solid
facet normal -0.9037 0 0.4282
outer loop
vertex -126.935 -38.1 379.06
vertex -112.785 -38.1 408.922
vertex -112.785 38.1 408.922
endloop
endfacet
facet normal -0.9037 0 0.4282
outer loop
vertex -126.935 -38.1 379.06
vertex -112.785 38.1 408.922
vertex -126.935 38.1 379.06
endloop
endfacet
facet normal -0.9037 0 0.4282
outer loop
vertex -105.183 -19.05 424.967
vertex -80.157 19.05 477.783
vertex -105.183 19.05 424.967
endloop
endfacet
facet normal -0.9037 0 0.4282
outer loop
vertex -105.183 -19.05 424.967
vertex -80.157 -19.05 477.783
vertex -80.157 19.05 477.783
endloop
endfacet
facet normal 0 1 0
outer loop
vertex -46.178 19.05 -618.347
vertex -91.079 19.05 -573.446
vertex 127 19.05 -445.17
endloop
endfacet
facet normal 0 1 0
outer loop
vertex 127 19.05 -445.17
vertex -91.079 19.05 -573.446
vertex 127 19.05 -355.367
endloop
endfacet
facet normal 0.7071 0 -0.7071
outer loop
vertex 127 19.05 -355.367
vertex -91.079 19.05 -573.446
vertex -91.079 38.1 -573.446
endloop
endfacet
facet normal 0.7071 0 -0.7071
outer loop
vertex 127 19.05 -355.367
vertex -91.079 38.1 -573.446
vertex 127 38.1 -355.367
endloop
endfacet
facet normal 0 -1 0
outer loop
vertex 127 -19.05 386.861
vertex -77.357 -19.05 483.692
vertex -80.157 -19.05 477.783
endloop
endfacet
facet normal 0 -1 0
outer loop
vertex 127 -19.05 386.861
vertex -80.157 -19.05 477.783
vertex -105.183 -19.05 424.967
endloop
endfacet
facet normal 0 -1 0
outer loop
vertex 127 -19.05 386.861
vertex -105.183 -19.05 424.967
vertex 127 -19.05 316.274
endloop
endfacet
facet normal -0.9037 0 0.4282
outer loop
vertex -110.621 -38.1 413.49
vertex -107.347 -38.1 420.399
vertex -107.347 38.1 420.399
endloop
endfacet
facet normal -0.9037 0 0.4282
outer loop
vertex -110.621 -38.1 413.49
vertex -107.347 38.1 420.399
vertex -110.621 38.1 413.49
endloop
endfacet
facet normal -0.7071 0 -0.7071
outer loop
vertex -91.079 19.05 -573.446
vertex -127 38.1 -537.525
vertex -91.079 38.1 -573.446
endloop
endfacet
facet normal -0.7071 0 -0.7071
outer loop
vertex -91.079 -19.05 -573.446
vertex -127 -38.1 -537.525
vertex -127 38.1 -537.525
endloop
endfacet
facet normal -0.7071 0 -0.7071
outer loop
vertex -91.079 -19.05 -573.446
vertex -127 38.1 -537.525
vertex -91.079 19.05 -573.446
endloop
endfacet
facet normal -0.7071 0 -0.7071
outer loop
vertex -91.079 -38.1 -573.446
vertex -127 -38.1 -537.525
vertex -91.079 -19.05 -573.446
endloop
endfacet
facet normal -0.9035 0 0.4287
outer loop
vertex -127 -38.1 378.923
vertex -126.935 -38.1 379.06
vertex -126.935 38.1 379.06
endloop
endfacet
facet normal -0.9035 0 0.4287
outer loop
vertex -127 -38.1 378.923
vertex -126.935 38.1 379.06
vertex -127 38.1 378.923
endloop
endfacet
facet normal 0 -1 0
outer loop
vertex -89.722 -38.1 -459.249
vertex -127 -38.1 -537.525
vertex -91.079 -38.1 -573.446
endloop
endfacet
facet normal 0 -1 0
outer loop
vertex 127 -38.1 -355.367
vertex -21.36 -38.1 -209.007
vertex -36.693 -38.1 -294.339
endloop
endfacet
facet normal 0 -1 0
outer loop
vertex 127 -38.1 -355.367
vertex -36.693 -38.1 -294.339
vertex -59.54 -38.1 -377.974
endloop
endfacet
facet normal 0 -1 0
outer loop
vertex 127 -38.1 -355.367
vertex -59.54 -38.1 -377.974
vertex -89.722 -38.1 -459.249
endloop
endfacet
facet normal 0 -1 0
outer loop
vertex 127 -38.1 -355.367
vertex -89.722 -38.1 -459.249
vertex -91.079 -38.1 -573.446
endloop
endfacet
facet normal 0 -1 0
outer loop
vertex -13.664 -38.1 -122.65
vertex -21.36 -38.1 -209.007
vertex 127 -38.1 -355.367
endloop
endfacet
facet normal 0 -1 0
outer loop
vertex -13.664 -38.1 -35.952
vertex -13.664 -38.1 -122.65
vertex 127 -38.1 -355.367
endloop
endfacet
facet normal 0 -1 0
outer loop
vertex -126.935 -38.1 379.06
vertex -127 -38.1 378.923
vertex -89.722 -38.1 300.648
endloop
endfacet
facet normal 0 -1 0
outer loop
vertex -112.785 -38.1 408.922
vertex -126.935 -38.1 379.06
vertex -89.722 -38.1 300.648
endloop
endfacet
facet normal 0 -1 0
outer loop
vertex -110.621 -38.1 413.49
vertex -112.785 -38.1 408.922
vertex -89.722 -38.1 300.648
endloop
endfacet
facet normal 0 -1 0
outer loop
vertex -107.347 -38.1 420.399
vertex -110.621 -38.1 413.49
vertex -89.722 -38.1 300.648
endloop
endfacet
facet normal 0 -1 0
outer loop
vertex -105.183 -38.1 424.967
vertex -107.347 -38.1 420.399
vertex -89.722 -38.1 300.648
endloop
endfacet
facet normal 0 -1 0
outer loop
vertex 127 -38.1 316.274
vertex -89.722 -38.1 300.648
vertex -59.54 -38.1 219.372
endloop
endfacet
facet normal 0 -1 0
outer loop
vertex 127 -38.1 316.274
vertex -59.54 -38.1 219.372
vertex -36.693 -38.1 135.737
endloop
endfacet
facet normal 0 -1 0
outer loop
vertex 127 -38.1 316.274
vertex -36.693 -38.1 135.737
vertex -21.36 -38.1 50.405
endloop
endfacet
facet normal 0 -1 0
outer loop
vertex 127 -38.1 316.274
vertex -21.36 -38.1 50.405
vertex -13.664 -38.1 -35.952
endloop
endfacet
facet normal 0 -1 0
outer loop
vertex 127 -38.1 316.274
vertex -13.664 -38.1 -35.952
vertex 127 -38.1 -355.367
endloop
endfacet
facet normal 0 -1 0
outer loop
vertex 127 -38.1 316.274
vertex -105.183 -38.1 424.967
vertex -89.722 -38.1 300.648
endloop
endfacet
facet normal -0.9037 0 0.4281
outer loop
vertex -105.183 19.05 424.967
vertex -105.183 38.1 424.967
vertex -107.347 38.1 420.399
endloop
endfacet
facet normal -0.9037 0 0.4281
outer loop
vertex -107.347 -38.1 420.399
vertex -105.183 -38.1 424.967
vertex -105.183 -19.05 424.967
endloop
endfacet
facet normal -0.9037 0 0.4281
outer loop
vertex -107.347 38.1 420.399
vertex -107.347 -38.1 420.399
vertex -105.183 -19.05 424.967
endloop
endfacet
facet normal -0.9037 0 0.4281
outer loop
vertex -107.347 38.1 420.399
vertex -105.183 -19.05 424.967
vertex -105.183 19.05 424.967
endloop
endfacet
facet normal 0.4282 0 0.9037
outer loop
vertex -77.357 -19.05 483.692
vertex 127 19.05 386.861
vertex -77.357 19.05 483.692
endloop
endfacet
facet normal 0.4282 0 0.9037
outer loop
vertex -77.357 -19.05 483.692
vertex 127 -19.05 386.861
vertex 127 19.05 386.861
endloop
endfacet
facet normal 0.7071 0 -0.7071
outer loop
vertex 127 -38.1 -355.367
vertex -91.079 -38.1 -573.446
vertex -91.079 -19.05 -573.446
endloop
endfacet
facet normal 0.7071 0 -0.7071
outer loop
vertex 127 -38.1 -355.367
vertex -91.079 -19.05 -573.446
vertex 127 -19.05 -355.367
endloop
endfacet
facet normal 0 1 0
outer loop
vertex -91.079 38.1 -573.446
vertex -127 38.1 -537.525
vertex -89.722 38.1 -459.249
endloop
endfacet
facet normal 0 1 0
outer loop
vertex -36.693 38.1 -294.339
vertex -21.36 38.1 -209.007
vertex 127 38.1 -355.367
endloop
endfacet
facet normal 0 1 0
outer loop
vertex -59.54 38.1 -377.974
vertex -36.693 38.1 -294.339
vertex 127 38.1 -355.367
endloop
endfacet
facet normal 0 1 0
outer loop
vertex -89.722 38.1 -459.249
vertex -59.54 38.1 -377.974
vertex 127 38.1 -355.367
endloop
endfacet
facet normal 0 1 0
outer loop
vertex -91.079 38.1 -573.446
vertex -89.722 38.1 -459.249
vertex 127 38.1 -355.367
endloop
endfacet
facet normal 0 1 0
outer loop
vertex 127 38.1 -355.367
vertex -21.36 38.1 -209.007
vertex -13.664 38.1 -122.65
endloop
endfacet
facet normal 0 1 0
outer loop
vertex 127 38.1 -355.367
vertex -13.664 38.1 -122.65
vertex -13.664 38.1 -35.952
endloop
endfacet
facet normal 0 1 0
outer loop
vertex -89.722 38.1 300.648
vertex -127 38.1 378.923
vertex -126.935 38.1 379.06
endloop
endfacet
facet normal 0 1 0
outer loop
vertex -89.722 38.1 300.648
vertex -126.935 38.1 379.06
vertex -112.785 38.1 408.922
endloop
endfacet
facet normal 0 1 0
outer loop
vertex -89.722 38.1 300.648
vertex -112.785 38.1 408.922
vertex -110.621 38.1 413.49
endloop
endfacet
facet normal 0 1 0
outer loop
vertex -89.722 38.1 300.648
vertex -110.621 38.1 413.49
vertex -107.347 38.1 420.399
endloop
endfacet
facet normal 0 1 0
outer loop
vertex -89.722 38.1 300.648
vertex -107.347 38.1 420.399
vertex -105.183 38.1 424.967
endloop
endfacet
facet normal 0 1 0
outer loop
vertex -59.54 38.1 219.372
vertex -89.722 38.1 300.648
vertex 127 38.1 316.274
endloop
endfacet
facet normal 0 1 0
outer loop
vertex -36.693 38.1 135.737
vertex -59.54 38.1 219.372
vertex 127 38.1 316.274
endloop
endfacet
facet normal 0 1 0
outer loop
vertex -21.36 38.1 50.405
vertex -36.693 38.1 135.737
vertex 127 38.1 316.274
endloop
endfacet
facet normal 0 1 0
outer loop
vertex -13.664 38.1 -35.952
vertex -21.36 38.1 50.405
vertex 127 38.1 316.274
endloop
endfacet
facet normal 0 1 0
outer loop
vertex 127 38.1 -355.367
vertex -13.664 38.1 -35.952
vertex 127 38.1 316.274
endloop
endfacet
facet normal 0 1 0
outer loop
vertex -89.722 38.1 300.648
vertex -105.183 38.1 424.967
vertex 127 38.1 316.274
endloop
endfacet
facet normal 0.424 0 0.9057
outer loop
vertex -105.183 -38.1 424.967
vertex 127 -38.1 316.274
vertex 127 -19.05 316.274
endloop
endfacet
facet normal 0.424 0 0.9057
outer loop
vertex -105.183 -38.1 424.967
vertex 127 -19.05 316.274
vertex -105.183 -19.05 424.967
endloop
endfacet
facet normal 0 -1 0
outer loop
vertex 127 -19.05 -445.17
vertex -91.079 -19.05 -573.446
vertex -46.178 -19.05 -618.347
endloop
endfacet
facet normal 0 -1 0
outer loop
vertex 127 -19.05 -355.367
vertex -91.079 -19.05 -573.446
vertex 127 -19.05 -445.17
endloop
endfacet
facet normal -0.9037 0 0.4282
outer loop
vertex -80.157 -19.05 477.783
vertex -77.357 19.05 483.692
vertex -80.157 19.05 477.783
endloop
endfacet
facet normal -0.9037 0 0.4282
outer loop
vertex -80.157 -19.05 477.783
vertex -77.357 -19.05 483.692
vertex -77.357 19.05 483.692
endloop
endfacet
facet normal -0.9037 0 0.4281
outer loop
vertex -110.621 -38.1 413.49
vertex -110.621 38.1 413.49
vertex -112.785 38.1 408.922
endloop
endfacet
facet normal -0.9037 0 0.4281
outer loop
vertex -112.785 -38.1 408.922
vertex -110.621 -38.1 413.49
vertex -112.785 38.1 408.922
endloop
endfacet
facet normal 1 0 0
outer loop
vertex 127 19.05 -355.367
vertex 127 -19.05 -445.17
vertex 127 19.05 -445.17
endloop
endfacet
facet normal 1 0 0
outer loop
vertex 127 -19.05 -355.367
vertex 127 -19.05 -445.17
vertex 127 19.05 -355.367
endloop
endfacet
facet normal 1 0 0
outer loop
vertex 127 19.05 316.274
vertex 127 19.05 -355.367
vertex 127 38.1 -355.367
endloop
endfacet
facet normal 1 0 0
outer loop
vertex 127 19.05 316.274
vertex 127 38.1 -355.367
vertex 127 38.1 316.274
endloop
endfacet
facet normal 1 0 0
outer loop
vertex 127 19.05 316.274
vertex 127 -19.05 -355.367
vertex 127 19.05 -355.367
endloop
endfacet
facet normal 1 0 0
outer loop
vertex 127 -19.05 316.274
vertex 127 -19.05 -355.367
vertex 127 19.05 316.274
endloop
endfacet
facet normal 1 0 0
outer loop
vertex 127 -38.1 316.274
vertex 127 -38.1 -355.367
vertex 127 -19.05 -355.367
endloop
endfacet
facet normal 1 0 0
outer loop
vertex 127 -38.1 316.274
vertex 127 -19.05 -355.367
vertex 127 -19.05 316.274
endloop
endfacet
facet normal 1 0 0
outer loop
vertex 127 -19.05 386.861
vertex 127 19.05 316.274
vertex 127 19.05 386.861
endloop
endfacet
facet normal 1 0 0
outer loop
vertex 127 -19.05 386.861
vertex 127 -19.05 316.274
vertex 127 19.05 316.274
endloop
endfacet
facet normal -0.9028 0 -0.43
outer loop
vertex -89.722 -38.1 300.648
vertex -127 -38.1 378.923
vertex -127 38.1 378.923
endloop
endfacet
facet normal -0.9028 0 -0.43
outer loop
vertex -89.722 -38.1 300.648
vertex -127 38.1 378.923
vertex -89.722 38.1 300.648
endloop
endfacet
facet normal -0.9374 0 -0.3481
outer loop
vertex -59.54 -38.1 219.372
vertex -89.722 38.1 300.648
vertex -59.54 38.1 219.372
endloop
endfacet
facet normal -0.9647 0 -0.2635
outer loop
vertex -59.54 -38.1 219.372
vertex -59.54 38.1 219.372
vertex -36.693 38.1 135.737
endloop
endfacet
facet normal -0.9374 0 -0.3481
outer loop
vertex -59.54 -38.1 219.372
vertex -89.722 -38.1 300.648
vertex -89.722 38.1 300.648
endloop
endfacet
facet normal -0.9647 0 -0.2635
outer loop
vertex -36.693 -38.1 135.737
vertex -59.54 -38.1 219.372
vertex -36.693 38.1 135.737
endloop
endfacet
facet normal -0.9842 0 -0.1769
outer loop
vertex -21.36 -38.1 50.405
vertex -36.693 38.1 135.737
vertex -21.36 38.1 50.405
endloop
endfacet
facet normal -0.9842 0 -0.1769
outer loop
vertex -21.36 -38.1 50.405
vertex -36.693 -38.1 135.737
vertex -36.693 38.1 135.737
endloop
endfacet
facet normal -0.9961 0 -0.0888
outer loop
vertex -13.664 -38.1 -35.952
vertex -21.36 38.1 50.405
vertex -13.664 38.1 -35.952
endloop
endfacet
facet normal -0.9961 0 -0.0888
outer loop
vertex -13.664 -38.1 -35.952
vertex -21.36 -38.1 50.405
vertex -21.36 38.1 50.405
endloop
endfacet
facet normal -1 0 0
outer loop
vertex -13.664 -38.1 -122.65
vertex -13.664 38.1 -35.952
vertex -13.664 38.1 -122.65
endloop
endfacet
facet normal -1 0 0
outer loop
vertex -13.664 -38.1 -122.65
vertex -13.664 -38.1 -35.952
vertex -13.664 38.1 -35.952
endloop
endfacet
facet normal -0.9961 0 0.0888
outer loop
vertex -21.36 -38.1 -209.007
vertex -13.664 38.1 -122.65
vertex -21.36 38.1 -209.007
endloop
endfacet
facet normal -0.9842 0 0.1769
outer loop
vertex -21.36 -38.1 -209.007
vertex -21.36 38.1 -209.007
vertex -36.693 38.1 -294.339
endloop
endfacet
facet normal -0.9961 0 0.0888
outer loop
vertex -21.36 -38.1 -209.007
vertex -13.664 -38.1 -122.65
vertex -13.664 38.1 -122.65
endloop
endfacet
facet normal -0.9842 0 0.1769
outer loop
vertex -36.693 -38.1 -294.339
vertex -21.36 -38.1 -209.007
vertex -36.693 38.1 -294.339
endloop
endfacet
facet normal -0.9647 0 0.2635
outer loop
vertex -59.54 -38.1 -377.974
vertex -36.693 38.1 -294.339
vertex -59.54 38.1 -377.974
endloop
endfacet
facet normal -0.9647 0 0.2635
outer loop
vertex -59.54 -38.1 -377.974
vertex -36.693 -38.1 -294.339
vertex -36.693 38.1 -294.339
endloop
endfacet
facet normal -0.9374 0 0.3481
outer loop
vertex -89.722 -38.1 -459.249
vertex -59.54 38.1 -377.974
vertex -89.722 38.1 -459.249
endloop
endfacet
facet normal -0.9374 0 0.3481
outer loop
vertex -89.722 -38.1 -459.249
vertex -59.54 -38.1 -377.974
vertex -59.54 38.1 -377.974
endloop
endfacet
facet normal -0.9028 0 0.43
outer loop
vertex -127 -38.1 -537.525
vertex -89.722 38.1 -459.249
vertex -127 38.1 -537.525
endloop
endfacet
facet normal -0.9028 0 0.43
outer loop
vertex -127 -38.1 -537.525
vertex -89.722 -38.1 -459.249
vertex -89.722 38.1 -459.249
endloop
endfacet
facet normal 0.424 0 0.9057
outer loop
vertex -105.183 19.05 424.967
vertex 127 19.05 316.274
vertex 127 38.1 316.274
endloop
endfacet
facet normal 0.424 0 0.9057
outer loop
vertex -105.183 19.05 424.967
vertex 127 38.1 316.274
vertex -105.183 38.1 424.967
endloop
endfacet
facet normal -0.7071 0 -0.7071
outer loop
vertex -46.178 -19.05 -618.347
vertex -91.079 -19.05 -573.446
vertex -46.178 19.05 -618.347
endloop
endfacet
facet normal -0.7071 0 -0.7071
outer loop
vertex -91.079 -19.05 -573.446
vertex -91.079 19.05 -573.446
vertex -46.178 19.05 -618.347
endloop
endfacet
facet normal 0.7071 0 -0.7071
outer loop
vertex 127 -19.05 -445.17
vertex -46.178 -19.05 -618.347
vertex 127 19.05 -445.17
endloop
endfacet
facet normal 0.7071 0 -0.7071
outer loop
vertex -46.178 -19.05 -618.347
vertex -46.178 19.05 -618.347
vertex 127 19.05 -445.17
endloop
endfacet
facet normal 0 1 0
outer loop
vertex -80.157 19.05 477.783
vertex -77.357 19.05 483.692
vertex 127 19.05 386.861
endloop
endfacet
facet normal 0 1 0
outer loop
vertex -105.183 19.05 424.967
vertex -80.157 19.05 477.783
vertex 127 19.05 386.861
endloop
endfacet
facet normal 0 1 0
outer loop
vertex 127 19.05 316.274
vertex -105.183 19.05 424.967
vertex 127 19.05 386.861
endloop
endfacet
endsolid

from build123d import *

# Parameters (mm, degrees)
F1_DEPTH = 38.1
F2_DEPTH = 19.05


with BuildPart() as f1:
    # F0 (on Front) → F1 (new body, symmetric)
    with BuildSketch(Plane.XZ):
        Polygon((-110.6208127871, 413.4903560323), (-112.7853297752, 408.9222720518), (127, 295.3036472591), (127, 302.2514283657), align=None)
        Polygon((127, -283.5250073743), (-127, -537.5250073743), (-91.0789755157, -573.4460318585), (127, -355.3670563428), align=None)
        with BuildLine():
            Line((-126.9351360354, 379.0599500378), (-127, 378.9230585098))
            ThreePointArc((-127, 378.9230585098), (-12.7, -79.3009744322), (-127, -537.5250073743))
            Line((-127, -537.5250073743), (127, -283.5250073743))
            Line((127, -283.5250073743), (127, 295.3036472591))
            Line((127, 295.3036472591), (-112.7853297752, 408.9222720518))
            Line((-112.7853297752, 408.9222720518), (-126.9351360354, 379.0599500378))
        make_face()
        Polygon((-107.3472207942, 420.3990766491), (-110.6208127871, 413.4903560323), (127, 302.2514283657), (127, 309.5502853394), align=None)
        Polygon((127, 309.5502853394), (127, 316.2741585044), (-105.1827050376, 424.9671580305), (-107.3472207942, 420.3990766491), align=None)
    extrude(amount=F1_DEPTH, both=True)

    # F0 (on Front) → F2 (join, symmetric)
    with BuildSketch(Plane.XZ):
        Polygon((127, -355.3670563428), (-91.0789755157, -573.4460318585), (-46.1776949104, -618.3473124639), (127, -445.1696175535), align=None)
        Polygon((127, 316.2741585044), (127, 379.6250462127), (-80.1566832786, 477.7830840409), (-105.1827050376, 424.9671580305), align=None)
        Polygon((-107.3472207942, 420.3990766491), (-110.6208127871, 413.4903560323), (127, 302.2514283657), (127, 309.5502853394), align=None)
        Polygon((127, 309.5502853394), (127, 316.2741585044), (-105.1827050376, 424.9671580305), (-107.3472207942, 420.3990766491), align=None)
        Polygon((127, 379.6250462127), (127, 386.8607449079), (-77.3567883787, 483.6920952011), (-80.1566832786, 477.7830840409), align=None)
    extrude(amount=F2_DEPTH, both=True)


solid = f1.part
